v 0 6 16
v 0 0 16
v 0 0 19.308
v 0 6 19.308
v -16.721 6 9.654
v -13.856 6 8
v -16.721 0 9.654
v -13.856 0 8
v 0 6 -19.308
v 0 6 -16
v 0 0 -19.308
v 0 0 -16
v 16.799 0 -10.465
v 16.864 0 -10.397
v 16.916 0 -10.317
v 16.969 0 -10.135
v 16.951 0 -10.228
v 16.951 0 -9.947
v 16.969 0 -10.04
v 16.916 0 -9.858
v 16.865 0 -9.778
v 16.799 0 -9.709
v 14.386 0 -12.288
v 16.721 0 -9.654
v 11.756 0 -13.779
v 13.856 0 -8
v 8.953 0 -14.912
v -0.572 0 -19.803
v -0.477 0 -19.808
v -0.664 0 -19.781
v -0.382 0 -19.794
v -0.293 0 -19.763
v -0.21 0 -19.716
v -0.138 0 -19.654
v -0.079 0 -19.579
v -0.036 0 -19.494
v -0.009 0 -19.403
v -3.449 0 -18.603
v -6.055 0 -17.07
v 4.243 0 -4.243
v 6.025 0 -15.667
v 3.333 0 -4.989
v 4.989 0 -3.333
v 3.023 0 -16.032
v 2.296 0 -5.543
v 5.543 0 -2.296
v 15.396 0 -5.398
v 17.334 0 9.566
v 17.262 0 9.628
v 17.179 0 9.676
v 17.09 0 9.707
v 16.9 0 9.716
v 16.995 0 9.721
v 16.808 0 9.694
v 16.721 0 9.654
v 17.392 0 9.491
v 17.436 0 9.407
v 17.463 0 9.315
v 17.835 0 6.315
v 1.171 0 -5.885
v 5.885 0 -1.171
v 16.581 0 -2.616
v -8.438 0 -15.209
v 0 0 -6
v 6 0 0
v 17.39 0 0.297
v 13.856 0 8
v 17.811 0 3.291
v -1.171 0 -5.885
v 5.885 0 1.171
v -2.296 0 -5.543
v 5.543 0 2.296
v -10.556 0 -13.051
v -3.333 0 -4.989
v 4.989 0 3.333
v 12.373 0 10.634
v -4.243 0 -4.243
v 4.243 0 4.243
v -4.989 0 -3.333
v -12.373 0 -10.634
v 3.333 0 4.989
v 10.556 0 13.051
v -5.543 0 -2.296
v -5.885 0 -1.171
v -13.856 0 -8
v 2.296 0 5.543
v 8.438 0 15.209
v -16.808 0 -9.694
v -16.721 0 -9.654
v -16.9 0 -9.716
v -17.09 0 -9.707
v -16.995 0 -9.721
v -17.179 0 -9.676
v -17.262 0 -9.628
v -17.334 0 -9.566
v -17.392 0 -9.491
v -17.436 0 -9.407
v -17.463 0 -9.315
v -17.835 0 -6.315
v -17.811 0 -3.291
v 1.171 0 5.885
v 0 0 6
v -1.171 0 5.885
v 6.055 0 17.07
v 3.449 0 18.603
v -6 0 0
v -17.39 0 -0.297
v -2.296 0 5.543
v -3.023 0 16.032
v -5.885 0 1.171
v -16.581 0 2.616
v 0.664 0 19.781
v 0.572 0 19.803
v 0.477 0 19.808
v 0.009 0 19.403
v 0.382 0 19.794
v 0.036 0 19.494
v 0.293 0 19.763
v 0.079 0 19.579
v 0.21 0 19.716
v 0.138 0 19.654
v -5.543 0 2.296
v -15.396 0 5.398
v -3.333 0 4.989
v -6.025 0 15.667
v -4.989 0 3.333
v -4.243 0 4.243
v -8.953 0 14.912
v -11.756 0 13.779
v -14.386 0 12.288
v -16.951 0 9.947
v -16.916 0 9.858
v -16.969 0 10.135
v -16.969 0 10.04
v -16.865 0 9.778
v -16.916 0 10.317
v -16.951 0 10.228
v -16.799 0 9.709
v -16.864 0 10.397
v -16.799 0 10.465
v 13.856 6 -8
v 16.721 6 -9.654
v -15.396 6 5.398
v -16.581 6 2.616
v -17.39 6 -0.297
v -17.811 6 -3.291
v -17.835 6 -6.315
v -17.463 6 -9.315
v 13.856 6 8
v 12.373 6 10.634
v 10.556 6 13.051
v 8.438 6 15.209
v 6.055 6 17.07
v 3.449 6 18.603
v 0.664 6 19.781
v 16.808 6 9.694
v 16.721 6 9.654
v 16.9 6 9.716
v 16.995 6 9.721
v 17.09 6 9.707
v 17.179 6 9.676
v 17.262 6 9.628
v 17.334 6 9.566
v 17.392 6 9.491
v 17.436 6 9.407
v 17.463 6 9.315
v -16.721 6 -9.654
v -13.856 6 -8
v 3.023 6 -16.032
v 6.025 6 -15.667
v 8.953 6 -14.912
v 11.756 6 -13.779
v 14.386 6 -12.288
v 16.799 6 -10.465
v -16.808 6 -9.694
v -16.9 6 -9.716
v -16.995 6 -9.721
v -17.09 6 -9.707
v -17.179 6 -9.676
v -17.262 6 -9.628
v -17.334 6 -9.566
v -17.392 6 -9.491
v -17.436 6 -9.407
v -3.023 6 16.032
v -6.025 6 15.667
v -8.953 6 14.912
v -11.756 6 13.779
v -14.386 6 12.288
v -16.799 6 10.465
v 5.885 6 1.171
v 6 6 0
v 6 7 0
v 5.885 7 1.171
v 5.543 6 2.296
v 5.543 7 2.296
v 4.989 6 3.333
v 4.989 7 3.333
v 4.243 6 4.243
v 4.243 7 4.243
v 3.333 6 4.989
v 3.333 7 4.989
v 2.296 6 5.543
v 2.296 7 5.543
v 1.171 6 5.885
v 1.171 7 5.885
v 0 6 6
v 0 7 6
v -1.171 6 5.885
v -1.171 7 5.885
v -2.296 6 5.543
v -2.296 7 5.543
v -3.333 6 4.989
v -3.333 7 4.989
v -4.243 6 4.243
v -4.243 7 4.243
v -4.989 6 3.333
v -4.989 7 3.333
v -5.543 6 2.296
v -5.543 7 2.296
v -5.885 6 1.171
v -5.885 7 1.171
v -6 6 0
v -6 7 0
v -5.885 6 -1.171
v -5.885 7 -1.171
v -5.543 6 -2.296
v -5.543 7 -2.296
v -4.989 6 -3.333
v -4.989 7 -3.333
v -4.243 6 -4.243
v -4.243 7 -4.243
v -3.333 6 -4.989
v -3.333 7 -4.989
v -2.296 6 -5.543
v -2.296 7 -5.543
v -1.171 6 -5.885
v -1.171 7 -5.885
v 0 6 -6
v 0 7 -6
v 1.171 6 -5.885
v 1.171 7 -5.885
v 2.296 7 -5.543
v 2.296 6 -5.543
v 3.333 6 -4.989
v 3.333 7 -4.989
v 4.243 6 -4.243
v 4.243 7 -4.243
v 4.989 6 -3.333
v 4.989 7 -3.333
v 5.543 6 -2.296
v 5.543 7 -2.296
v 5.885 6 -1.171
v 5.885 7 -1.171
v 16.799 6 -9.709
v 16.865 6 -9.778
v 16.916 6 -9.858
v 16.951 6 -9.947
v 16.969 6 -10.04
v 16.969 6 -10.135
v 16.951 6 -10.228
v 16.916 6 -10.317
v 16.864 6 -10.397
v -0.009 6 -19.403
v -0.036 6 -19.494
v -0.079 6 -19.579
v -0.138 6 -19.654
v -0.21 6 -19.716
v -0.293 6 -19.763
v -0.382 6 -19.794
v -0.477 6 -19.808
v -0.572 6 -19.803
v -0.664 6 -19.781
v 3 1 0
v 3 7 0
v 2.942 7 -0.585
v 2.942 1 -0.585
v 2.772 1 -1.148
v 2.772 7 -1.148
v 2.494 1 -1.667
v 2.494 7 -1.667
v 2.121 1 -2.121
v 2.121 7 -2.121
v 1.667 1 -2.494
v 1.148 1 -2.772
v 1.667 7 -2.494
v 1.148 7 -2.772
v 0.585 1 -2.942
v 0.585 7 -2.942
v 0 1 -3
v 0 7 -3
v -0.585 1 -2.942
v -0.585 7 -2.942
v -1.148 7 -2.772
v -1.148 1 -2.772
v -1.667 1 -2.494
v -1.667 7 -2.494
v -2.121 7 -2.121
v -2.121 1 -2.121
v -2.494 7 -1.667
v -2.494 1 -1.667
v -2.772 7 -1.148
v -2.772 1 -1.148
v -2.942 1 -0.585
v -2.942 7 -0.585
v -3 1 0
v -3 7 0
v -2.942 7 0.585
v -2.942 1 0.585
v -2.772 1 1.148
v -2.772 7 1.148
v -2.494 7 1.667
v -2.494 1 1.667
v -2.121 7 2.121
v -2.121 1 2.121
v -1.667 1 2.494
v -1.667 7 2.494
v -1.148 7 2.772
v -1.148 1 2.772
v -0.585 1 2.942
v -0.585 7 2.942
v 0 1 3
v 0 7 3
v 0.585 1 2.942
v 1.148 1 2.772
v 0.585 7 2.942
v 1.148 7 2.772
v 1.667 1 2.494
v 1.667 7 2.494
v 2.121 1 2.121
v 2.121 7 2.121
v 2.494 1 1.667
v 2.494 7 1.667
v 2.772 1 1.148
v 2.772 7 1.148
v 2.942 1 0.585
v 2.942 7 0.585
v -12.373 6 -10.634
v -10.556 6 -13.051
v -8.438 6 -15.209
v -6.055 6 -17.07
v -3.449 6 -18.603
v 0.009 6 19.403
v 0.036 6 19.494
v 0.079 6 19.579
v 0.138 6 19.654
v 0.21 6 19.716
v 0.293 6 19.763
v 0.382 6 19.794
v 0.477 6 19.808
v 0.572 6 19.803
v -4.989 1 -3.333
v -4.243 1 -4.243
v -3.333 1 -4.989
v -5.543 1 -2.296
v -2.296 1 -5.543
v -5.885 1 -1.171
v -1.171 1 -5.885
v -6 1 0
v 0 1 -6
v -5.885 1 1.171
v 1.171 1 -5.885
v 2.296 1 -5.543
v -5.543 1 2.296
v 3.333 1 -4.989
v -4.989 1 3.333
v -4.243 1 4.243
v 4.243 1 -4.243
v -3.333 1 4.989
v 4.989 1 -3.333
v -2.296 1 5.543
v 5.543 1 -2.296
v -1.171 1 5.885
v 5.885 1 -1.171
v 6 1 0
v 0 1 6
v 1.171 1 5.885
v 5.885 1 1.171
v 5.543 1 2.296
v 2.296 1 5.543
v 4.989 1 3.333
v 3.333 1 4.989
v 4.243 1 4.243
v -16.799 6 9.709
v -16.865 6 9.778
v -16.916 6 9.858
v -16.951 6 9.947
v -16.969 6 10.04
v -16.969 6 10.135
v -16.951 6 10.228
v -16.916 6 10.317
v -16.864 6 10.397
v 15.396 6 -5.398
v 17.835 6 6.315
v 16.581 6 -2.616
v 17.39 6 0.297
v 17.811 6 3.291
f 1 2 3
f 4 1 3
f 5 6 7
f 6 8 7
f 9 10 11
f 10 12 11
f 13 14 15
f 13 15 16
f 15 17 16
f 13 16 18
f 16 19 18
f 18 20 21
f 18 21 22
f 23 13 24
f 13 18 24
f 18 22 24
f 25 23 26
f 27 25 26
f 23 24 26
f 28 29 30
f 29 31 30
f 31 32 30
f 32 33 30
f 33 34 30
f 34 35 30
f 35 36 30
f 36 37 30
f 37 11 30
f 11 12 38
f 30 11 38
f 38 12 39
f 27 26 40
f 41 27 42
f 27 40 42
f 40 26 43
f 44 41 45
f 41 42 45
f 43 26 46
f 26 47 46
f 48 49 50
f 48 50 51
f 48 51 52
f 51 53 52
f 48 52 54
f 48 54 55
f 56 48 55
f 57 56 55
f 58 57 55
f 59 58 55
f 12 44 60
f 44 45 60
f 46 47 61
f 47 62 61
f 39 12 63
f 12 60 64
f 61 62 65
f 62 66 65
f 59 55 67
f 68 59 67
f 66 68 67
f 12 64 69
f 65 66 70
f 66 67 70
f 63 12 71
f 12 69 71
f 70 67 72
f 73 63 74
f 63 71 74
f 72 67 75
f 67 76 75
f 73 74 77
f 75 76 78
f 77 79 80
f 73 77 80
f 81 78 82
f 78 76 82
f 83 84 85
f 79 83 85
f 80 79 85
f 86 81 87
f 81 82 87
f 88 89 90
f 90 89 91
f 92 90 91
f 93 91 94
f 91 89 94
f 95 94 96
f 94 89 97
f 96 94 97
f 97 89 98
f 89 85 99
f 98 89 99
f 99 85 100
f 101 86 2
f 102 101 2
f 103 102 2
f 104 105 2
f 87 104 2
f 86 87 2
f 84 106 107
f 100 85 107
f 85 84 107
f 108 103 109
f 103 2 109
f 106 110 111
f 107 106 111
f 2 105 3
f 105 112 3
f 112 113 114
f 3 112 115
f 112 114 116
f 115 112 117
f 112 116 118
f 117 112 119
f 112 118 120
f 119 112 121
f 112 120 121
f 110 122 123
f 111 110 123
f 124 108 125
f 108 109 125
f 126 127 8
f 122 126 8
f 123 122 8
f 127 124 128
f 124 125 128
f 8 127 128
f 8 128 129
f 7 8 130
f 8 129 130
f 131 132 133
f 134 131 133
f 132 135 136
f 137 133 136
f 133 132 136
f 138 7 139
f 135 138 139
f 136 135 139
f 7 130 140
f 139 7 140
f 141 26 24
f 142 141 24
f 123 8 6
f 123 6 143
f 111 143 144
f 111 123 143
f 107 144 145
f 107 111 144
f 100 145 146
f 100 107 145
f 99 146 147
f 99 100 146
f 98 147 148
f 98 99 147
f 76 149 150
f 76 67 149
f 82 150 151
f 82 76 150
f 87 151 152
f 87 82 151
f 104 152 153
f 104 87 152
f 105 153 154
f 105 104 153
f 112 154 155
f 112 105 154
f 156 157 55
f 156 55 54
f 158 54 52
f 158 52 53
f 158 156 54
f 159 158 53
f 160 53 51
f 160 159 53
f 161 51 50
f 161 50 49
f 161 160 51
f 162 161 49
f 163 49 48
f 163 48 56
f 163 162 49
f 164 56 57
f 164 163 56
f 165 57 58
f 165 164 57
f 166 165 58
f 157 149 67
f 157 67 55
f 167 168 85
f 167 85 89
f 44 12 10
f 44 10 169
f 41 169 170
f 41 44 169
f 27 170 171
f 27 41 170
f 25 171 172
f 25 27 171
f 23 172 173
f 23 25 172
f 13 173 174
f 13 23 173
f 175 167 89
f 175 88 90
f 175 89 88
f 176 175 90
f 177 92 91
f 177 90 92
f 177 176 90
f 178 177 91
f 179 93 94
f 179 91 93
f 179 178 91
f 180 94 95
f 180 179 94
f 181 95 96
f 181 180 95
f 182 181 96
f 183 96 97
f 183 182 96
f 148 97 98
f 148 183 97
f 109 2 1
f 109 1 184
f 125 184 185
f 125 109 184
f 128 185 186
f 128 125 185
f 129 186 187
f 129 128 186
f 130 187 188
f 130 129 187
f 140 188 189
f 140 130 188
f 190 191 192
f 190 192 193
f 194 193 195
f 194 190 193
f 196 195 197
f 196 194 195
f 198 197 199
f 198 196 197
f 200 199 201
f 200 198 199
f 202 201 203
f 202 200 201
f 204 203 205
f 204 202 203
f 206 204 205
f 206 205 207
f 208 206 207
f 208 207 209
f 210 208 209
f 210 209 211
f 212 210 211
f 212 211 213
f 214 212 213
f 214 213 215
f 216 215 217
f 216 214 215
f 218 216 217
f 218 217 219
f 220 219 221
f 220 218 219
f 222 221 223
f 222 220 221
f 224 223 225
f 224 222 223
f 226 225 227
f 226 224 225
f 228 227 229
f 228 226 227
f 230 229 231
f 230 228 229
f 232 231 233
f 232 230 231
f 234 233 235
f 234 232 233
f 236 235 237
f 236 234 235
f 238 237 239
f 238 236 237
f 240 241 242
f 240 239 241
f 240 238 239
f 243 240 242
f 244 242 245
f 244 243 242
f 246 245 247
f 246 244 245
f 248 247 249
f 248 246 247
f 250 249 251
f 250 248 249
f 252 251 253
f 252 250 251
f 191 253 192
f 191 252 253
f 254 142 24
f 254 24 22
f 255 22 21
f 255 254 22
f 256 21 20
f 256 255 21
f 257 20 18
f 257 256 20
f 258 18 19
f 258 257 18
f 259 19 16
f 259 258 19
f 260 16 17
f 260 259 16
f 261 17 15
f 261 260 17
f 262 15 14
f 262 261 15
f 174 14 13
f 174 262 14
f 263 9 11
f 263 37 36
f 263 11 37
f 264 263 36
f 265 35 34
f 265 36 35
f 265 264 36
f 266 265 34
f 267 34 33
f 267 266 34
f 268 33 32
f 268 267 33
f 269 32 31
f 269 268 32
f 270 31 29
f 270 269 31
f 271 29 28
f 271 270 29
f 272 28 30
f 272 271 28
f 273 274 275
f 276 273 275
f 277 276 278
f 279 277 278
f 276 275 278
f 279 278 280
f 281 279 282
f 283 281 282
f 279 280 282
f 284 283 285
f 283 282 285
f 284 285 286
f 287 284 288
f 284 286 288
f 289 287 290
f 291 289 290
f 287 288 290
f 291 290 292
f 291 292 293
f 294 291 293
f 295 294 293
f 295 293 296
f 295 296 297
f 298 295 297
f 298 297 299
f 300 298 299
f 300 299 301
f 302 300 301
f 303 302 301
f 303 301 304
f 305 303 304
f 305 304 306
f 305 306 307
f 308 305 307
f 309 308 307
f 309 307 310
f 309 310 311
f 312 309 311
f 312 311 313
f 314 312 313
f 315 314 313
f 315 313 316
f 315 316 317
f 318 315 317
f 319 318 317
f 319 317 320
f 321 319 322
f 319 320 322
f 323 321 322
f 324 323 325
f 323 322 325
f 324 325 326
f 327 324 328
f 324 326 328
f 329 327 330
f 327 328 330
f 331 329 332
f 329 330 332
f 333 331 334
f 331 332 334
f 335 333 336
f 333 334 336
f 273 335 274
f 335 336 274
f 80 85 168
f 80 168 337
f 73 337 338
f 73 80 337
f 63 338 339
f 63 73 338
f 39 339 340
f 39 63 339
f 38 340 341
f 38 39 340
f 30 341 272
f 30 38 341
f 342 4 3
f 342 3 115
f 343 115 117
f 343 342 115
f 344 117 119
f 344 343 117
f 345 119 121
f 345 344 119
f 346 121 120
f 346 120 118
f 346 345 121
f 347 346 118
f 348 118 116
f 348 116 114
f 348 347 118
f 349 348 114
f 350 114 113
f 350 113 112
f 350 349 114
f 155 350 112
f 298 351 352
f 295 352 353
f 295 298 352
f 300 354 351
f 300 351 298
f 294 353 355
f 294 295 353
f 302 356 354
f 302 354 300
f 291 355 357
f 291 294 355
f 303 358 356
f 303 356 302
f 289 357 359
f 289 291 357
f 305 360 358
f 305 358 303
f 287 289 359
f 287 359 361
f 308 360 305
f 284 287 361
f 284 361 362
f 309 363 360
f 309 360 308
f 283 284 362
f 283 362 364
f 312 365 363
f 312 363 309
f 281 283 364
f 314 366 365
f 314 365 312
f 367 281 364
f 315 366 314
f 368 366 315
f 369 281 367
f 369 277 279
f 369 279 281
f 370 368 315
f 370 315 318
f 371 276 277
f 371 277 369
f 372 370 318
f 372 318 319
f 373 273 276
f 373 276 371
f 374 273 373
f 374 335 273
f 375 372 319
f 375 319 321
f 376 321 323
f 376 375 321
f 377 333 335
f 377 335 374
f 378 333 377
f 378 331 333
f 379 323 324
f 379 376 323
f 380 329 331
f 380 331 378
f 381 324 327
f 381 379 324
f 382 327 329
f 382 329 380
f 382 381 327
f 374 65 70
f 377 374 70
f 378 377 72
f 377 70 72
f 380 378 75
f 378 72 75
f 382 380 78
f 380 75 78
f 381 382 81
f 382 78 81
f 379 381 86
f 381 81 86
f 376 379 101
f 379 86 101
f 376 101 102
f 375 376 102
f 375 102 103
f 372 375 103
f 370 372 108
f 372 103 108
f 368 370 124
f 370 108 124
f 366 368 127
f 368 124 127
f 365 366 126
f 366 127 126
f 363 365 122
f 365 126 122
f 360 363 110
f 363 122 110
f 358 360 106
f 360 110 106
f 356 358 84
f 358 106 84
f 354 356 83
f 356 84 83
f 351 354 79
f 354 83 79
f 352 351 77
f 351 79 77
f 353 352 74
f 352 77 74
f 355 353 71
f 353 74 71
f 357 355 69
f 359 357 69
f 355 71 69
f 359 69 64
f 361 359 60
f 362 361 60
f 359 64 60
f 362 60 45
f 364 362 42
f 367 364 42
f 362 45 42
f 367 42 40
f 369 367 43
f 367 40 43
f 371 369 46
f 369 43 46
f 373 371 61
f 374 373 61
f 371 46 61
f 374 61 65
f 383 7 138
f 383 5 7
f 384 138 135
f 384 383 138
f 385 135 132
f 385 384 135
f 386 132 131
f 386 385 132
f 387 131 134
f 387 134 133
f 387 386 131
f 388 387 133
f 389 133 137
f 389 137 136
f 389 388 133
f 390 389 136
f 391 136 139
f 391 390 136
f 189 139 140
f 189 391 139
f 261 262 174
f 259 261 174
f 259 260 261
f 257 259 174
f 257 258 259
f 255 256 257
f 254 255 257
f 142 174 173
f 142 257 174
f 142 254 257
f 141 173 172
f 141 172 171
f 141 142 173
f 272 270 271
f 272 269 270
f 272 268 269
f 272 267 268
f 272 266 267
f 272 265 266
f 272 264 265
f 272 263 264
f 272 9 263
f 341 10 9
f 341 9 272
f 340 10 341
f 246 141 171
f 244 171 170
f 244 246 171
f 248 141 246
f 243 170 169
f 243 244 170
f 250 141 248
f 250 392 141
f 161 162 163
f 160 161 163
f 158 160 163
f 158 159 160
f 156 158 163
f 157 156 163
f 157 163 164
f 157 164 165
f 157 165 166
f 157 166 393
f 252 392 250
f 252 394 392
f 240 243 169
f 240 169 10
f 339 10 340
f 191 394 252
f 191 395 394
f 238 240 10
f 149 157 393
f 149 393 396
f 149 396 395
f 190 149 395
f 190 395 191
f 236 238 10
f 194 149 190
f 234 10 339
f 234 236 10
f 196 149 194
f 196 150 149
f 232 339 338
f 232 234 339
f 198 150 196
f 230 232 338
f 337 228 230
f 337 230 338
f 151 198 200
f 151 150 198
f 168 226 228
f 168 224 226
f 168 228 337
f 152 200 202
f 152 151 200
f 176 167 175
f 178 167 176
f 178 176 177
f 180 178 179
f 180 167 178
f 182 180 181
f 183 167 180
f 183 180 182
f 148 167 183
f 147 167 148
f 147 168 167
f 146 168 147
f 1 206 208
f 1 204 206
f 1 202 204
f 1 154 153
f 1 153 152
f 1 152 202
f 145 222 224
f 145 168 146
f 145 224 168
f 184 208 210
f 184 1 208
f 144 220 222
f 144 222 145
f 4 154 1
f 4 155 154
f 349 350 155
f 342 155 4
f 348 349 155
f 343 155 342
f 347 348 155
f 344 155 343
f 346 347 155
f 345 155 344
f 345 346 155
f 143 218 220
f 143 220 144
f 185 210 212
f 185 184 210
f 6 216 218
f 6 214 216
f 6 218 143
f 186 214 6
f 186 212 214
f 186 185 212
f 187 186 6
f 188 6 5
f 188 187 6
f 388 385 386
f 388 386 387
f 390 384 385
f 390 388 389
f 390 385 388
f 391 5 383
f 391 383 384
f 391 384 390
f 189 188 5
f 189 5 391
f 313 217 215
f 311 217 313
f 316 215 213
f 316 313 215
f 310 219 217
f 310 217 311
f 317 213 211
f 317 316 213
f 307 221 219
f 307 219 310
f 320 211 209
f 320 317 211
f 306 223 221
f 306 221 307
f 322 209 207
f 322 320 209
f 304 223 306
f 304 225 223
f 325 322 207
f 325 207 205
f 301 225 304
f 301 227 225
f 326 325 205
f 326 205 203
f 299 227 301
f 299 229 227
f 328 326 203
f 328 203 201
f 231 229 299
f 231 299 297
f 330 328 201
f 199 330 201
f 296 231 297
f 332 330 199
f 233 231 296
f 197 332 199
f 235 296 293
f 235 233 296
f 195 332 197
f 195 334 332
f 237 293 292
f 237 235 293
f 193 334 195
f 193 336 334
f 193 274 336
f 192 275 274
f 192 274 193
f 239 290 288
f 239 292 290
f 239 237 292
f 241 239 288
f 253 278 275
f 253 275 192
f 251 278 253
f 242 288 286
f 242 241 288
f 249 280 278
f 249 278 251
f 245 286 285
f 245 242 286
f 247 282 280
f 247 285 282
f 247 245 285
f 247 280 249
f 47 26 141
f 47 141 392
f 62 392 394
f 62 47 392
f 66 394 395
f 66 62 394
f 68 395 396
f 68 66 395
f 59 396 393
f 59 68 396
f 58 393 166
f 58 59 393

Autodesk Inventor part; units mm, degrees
ref_plane "YZ Plane" through (0, 0, 0) normal (1, 0, 0) x (0, 1, 0)
ref_plane "XZ Plane" through (0, 0, 0) normal (0, 1, 0) x (-1, 0, 0)
ref_plane "XY Plane" through (0, 0, 0) normal (0, 0, 1) x (1, 0, 0)
sketch "Szkic1" plane through (0, 0, 0) normal (0, 1, 0) x (-1, 0, 0)
  circle A0 centre (0, 0) radius 20
  circle A1 centre (0, 0) radius 16
  line L0 (0, 0) -> (-17.3205, -10)
  line L1 (0, 0) -> (20, 0) construction
  line L2 (0, 0) -> (-17.3205, 10)
  line L3 (0, 0) -> (20, 0) construction
  line L4 (0, 0) -> (0, 20)
  line L5 (0, 0) -> (20, 0) construction
  line L6 (0, 0) -> (17.3205, 10)
  line L7 (0, 0) -> (17.3205, -10)
  line L8 (0, 0) -> (0, -20)
  line L9 (0, -20) -> (13.8564, -8)
  line L10 (17.3205, -10) -> (13.8564, 8)
  line L11 (17.3205, 10) -> (0, 16)
  line L12 (0, 20) -> (-13.8564, 8)
  line L13 (-17.3205, 10) -> (-13.8564, -8)
  line L14 (-17.3205, -10) -> (0, -16)
  line L15 (0, -20) -> (0, -16)
  line L16 (17.3205, -10) -> (13.8564, -8)
  line L17 (17.3205, 10) -> (13.8564, 8)
  line L18 (0, 16) -> (0, 20)
  arc A2 (-17.3205, -10) -> (0, -16) centre (-1.7553, 6.9329) ccw
  arc A3 (0, -20) -> (13.8564, -8) centre (-6.8817, 1.9463) ccw
  arc A4 (17.3205, -10) -> (13.8564, 8) centre (-5.1264, -4.9866) ccw
  arc A5 (17.3205, 10) -> (0, 16) centre (1.7553, -6.9329) ccw
  arc A6 (-17.3205, 10) -> (-13.8564, -8) centre (5.1264, 4.9866) ccw
  arc A7 (0, 20) -> (-13.8564, 8) centre (6.8817, -1.9463) ccw
  dimension "d0" = 40
  dimension "d1" = 32
  dimension "d2" = 150
  dimension "d3" = 150
  dimension "d4" = 90
  dimension "d5" = 23
  dimension "d6" = 23
  dimension "d7" = 23
  dimension "d8" = 23
  dimension "d9" = 23
  dimension "d10" = 23
extrude "Wyciągnięcie proste1" add sketch "Szkic1" along normal blind 6 contours L6 A1 L11 | L11 A1 A5 | L7 A1 L10 | L10 A1 A4 | L4 A1 L12 | L12 A1 A7 | L6 L4 L11 A1 | L10 A1 L7 L6 | A1 L10 | L11 A1 | L4 L2 L12 A1 | L8 A1 L9 | L9 A1 A3 | L9 A1 L8 L7 | A1 L9 | L2 A1 L13 | L13 A1 A6 | L12 A1 | L2 L0 L13 A1 | L8 L14 A1 L0 | L0 A1 L14 | L14 A1 A2 | A1 L14 | L13 A1
fillet "Zaokrąglenie1" radius 0.5 6 edges at (0, 3, -20) (17.3205, 3, -10) (17.3205, 3, 10) (0, 3, 20) (-17.3205, 3, 10) (-17.3205, 3, -10)
sketch "Szkic2" plane through (0, 6, 0) normal (0, 1, 0) x (1, 0, 0)
  circle A0 centre (0, 0) radius 6
  dimension "d14" = 12
extrude "Wyciągnięcie proste2" add sketch "Szkic2" along normal blind 1
sketch "Szkic3" plane through (0, 0, 0) normal (0, -1, 0) x (1, 0, 0)
  circle A0 centre (0, 0) radius 6
  dimension "d17" = 12
extrude "Wyciągnięcie proste3" cut sketch "Szkic3" against normal blind 1
sketch "Szkic4" plane through (0, 7, 0) normal (0, 1, 0) x (1, 0, 0)
  circle A0 centre (0, 0) radius 3
  dimension "d20" = 6
extrude "Wyciągnięcie proste4" cut sketch "Szkic4" against normal blind 6
